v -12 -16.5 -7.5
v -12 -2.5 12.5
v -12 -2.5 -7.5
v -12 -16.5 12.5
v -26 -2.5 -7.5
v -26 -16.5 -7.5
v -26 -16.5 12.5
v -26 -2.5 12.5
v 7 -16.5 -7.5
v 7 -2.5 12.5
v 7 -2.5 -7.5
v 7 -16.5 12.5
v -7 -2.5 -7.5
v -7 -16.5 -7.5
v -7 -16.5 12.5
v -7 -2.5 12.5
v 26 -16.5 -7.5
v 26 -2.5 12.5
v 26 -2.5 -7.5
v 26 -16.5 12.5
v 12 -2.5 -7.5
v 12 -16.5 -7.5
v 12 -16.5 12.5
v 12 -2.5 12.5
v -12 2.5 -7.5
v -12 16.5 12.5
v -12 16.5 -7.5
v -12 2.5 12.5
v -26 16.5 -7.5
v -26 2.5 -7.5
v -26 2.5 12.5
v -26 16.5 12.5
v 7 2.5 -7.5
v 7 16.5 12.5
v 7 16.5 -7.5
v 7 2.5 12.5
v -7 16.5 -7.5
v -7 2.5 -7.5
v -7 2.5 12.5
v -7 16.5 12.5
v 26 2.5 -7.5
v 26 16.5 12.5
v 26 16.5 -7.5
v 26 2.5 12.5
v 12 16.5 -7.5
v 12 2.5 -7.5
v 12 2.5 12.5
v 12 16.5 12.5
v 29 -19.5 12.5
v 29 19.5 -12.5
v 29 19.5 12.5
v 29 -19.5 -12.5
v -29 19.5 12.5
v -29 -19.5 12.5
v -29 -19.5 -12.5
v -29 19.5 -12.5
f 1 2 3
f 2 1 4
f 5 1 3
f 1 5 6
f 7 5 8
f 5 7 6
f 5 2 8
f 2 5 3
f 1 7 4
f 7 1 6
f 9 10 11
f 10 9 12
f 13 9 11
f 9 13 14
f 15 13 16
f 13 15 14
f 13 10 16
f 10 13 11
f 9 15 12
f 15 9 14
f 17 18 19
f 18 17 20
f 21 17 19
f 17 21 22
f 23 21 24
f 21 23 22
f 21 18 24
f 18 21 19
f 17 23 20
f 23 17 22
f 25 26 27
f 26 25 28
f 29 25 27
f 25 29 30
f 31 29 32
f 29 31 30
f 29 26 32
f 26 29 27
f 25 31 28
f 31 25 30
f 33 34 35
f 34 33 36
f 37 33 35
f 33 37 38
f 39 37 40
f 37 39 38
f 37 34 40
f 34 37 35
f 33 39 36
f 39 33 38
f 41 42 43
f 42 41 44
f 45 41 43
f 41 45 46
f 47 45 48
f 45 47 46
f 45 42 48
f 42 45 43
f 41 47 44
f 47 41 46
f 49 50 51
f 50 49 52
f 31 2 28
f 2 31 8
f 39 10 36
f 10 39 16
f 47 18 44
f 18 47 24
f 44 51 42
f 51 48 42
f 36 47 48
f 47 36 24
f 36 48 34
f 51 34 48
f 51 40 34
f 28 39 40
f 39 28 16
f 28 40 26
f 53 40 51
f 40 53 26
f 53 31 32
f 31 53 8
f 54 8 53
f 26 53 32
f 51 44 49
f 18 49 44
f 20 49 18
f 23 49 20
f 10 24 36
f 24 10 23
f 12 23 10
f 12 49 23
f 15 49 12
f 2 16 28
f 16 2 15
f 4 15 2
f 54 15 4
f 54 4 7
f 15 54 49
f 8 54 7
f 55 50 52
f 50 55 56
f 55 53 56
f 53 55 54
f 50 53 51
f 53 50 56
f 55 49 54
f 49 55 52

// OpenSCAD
$fn = 32;

// ----------------------------------------------------------------------
// Pocket plate 58 x 39 x 25
// 2 x 3 pockets 14 mm square, 20 mm deep
// ----------------------------------------------------------------------

// --- parameters (mm) ---
thickness = 25;  // plate thickness
floor_t = 5;     // material left under each pocket
pocket = 14;     // pocket side length
pitch_x = 19;    // pocket pitch along X
pitch_y = 19;    // pocket pitch along Y
cols = 3;        // pockets per row
rows = 2;        // rows of pockets

// --- derived feature positions (mm) ---
depth = thickness - floor_t;        // = 20   pocket depth, down to the floor
span_x = (cols - 1) * pitch_x;      // = 38   distance between outer pockets
span_y = (rows - 1) * pitch_y;      // = 19   distance between outer pocket rows
origin_x = -span_x / 2;             // = -19   X of the first pocket
origin_y = -span_y / 2;             // = -9.5   Y of the first pocket
plate = [span_x + pocket + 6, span_y + pocket + 6, thickness];  // = [58, 39, 25]   overall size: pockets plus 3 mm of wall on each side
feature_centers = [
  [origin_x + 0 * pitch_x, origin_y + 0 * pitch_y],
  [origin_x + 1 * pitch_x, origin_y + 0 * pitch_y],
  [origin_x + 2 * pitch_x, origin_y + 0 * pitch_y],
  [origin_x + 0 * pitch_x, origin_y + 1 * pitch_y],
  [origin_x + 1 * pitch_x, origin_y + 1 * pitch_y],
  [origin_x + 2 * pitch_x, origin_y + 1 * pitch_y]
];   // pocket centres, used verbatim by the cutter loop

// plate outline, then one pocket per centre in feature_centers
difference() {
  cube(plate, center = true);
  for (centre = feature_centers)
    translate([centre[0] - pocket / 2, centre[1] - pocket / 2, plate[2] / 2 - depth])
      cube([pocket, pocket, depth + 1]);  // centred on the declared pocket centre
}
